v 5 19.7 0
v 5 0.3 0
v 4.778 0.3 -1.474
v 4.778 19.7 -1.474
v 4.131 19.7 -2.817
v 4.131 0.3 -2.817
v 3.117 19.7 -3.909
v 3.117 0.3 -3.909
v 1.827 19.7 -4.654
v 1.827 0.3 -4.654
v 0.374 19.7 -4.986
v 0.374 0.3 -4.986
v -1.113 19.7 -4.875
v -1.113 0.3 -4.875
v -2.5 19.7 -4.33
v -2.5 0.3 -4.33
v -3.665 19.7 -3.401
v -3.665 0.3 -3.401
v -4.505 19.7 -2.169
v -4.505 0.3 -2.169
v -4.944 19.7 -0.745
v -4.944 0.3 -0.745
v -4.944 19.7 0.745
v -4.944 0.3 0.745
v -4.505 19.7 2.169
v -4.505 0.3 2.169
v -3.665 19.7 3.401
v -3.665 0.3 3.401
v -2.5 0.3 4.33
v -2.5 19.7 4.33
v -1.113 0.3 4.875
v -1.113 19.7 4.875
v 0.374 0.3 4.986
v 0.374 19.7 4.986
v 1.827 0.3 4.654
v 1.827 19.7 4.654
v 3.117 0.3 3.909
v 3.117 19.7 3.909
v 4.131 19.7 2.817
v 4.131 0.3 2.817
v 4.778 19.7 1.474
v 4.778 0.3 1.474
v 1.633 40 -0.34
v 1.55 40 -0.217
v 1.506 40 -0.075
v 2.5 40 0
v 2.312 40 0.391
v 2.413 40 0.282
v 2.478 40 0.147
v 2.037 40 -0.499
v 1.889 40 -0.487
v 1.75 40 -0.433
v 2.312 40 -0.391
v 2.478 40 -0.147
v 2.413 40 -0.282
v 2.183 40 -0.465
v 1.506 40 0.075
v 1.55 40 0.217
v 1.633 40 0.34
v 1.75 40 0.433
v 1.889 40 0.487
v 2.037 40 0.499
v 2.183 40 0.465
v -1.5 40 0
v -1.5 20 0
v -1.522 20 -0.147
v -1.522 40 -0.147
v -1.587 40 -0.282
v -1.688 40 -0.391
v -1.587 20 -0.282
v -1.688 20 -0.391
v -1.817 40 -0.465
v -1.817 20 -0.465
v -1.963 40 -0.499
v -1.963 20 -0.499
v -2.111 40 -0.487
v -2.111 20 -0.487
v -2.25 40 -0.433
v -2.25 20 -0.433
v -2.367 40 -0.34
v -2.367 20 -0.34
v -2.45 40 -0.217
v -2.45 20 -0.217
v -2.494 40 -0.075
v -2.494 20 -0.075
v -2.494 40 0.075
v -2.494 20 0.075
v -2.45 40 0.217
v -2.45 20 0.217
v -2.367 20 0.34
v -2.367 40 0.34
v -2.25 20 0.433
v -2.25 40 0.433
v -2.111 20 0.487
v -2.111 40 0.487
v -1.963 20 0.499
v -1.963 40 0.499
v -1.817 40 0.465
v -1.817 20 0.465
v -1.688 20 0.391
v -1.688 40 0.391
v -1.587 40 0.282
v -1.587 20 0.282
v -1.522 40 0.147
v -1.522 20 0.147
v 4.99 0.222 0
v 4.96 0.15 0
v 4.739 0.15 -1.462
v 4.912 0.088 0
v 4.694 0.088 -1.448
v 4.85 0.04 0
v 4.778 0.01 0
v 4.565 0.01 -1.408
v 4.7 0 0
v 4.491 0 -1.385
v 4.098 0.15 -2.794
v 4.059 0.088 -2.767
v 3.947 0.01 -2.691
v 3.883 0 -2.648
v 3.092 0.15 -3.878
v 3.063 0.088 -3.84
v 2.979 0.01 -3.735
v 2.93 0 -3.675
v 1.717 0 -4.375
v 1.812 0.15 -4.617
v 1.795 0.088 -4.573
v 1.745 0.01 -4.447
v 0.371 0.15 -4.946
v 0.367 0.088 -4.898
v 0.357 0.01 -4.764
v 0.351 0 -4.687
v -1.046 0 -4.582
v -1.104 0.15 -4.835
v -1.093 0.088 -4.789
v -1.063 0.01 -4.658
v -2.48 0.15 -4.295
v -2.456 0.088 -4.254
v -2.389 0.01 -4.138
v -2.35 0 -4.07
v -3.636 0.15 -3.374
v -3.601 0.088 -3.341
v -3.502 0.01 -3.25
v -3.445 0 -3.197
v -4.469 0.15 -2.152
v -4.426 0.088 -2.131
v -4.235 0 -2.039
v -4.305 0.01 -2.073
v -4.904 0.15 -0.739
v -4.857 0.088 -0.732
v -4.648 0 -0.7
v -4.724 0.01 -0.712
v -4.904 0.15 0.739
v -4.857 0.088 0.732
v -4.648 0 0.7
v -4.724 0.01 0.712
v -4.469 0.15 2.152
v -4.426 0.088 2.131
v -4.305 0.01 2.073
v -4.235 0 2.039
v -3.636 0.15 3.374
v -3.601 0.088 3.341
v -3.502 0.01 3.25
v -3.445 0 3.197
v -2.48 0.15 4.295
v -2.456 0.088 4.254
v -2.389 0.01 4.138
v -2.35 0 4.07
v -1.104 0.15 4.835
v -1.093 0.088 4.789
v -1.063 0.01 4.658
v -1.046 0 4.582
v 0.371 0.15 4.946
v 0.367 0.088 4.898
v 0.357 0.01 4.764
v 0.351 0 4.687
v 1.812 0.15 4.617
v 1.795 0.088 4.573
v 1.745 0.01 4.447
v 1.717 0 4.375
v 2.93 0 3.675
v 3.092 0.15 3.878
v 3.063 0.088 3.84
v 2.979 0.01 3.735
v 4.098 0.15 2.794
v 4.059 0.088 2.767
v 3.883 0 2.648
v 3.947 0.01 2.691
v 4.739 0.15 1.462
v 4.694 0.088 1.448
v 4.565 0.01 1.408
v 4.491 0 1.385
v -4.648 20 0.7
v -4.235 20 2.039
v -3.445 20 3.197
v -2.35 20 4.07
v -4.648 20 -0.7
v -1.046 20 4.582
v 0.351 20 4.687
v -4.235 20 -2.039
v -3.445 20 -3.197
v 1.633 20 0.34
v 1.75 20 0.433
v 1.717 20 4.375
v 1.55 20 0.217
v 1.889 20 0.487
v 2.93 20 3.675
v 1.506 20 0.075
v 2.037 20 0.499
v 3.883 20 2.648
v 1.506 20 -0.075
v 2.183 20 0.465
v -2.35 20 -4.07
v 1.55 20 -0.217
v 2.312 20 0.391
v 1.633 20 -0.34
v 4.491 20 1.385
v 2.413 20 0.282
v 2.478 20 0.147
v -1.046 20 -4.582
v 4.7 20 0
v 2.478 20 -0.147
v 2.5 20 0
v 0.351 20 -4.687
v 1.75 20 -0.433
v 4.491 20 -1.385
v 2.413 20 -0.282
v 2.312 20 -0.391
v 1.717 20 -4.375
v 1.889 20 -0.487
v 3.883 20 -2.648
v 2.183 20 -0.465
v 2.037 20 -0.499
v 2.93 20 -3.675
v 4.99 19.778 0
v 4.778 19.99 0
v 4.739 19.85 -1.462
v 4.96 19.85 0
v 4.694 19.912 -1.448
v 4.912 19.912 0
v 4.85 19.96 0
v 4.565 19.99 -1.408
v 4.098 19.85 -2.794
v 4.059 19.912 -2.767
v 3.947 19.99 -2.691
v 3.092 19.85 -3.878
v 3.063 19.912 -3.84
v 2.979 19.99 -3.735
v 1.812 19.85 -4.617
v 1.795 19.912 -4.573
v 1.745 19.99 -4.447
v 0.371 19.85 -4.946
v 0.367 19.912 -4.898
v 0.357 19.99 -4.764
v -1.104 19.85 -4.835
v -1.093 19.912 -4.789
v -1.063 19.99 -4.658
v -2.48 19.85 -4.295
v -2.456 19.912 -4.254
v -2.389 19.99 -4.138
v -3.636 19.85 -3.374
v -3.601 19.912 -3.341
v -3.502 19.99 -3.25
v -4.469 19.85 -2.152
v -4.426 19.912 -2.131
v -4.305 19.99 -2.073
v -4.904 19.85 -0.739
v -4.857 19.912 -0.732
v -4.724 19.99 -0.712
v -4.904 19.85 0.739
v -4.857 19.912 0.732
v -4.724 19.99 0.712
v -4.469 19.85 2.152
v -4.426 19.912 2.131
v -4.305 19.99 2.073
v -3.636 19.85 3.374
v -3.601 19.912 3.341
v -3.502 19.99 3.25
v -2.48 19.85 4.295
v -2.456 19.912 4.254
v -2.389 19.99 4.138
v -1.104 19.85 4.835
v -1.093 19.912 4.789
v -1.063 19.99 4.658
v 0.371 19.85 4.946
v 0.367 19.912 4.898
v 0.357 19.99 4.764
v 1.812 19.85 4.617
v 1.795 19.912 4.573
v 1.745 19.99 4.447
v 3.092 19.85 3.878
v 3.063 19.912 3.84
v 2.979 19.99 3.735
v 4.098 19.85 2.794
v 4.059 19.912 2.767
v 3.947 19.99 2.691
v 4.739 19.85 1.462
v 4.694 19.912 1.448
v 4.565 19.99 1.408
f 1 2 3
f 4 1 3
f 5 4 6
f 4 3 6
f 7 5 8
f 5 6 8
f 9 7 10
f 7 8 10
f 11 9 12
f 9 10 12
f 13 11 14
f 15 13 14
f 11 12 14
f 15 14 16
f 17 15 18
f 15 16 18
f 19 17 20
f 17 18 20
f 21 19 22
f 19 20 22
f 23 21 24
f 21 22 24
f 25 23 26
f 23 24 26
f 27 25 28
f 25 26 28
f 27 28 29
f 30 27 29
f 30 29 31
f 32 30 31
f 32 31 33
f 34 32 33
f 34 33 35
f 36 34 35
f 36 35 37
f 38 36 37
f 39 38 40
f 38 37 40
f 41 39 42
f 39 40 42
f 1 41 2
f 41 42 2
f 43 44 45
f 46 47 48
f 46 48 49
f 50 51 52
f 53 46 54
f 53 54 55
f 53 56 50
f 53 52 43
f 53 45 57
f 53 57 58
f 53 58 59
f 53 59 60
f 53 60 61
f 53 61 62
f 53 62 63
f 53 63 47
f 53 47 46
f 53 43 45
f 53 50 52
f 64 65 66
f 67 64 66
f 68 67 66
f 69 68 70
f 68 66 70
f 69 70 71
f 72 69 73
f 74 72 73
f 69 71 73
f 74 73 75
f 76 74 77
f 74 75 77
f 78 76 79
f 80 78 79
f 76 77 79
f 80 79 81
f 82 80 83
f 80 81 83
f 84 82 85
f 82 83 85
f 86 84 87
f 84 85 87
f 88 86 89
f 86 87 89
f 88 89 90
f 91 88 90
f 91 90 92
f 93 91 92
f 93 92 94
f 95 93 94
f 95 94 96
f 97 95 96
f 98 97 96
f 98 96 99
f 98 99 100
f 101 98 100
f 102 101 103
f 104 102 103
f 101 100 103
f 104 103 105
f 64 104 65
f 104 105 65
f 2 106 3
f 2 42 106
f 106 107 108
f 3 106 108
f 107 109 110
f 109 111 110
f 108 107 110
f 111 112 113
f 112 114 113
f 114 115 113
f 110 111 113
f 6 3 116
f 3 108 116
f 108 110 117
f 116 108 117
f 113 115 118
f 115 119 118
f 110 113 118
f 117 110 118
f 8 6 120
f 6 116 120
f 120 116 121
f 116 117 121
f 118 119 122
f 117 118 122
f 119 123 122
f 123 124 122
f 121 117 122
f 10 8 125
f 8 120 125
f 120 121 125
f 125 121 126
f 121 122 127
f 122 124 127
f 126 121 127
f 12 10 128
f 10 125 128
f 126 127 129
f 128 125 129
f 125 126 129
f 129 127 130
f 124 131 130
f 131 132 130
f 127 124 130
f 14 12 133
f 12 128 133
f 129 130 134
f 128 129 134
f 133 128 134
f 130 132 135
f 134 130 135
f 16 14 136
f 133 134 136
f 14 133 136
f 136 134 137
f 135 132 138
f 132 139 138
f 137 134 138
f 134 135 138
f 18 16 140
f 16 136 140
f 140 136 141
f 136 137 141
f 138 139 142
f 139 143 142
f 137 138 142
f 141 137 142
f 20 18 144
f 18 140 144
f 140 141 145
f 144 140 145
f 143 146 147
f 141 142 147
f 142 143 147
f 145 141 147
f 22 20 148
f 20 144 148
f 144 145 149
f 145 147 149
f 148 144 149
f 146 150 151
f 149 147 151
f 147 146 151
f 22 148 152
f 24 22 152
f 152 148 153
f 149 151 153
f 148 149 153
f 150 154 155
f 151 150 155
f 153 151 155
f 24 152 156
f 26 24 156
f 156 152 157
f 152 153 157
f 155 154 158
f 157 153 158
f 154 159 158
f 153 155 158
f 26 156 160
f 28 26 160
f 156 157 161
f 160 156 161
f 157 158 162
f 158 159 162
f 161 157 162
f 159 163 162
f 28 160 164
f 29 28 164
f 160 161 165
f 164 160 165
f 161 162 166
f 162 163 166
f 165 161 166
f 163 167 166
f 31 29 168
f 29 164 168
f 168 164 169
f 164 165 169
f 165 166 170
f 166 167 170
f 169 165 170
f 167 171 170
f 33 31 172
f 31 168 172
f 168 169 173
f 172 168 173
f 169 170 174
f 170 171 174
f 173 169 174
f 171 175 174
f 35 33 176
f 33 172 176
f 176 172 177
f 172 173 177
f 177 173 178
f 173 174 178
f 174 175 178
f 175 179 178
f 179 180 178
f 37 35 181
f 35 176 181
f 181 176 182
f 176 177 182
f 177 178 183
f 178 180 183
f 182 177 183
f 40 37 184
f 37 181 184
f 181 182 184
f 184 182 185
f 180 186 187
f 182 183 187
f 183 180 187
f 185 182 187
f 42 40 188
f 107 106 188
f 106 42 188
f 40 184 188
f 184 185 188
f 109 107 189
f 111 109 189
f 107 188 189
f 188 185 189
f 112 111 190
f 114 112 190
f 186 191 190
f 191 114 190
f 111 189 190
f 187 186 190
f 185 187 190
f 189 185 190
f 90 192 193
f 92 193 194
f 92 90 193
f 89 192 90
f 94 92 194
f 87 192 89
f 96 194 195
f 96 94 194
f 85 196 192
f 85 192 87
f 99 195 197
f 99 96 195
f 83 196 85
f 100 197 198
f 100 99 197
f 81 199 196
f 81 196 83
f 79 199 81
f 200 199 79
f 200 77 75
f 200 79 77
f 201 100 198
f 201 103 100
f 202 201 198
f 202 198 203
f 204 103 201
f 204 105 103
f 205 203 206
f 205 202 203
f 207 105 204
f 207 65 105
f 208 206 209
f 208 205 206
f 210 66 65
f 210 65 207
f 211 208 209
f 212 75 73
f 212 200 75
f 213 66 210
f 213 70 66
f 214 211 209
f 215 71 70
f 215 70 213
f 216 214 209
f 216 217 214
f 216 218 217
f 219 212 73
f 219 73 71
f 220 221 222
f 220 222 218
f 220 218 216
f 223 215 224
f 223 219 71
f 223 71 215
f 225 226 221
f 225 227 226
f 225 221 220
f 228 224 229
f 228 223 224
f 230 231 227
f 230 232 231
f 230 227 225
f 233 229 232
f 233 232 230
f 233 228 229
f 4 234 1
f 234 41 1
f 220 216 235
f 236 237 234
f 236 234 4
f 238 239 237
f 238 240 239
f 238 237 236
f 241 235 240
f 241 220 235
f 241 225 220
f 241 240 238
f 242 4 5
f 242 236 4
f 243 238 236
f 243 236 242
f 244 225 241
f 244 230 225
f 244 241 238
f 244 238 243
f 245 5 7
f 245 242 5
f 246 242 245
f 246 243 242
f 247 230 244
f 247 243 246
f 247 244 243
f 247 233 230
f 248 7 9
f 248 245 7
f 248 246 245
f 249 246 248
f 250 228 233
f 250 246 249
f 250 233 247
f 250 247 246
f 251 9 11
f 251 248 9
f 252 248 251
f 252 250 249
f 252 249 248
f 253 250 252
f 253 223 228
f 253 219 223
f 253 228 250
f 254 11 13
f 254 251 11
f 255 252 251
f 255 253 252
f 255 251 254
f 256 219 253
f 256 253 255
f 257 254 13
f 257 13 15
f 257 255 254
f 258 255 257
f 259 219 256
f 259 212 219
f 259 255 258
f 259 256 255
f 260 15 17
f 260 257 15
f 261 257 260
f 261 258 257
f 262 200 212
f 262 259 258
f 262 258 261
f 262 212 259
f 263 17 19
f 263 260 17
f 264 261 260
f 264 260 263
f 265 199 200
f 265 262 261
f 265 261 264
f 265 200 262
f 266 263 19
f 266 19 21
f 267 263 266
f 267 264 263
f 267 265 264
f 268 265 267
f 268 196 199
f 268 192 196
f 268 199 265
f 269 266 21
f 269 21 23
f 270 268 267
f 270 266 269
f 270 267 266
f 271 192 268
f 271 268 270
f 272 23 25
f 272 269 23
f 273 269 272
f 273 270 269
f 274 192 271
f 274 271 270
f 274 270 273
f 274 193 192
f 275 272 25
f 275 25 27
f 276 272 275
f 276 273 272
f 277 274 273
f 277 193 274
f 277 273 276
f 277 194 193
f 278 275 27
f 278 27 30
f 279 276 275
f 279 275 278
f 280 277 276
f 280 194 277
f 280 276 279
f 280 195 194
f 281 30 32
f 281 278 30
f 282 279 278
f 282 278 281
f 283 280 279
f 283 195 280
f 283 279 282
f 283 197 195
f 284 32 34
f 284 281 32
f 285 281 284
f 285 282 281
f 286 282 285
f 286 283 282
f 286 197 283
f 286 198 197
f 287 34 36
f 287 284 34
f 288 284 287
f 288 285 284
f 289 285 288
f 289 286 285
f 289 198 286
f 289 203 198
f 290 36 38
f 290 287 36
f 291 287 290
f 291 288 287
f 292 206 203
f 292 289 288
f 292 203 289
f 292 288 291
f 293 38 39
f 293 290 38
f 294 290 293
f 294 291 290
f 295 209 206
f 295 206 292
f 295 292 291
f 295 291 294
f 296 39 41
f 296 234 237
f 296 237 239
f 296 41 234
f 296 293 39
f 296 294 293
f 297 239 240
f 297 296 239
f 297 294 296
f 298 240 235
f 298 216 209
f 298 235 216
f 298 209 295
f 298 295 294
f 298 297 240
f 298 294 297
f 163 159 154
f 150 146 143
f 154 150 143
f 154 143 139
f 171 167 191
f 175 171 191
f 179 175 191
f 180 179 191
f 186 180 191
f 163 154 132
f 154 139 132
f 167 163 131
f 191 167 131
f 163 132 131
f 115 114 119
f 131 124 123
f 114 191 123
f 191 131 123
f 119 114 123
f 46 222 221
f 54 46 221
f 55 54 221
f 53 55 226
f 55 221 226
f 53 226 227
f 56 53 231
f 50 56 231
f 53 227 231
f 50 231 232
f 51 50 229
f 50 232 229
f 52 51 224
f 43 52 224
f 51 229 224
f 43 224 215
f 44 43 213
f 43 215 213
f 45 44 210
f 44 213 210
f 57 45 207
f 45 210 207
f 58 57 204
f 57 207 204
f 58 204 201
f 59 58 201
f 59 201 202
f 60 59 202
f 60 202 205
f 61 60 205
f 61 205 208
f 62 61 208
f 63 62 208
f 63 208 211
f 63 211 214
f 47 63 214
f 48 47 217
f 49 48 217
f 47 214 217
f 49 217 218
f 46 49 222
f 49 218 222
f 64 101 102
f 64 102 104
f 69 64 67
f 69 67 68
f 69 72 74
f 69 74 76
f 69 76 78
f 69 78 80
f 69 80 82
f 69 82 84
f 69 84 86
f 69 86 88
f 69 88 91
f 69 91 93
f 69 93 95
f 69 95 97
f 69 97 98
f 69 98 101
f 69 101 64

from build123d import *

# Parameters (mm, degrees)
SKETCH1_R           = 5
BOSS_EXTRUDE1_DEPTH = 20
SKETCH2_R           = 0.5
BOSS_EXTRUDE2_DEPTH = 20
FILLET1_R           = 0.3


with BuildPart() as part:
    # Sketch1 → Boss-Extrude1 (new body)
    with BuildSketch(Plane(origin=(0, 0, 0), x_dir=(1, 0, 0), z_dir=(0, 1, 0))):
        Circle(SKETCH1_R)
    extrude(amount=BOSS_EXTRUDE1_DEPTH)

    # Sketch2 → Boss-Extrude2 (add)
    with BuildSketch(Plane(origin=(0, 20, 0), x_dir=(1, 0, 0), z_dir=(0, 1, 0))):
        with Locations((-2, 0)):
            Circle(SKETCH2_R)
        with Locations((2, 0)):
            Circle(SKETCH2_R)
    extrude(amount=BOSS_EXTRUDE2_DEPTH)

    # Fillet1
    fillet1_edges = [part.edges().sort_by_distance(p)[0] for p in [
        (-5, 0, 0),
        (-5, 20, 0),
    ]]
    fillet(fillet1_edges, radius=FILLET1_R)


solid = part.part
